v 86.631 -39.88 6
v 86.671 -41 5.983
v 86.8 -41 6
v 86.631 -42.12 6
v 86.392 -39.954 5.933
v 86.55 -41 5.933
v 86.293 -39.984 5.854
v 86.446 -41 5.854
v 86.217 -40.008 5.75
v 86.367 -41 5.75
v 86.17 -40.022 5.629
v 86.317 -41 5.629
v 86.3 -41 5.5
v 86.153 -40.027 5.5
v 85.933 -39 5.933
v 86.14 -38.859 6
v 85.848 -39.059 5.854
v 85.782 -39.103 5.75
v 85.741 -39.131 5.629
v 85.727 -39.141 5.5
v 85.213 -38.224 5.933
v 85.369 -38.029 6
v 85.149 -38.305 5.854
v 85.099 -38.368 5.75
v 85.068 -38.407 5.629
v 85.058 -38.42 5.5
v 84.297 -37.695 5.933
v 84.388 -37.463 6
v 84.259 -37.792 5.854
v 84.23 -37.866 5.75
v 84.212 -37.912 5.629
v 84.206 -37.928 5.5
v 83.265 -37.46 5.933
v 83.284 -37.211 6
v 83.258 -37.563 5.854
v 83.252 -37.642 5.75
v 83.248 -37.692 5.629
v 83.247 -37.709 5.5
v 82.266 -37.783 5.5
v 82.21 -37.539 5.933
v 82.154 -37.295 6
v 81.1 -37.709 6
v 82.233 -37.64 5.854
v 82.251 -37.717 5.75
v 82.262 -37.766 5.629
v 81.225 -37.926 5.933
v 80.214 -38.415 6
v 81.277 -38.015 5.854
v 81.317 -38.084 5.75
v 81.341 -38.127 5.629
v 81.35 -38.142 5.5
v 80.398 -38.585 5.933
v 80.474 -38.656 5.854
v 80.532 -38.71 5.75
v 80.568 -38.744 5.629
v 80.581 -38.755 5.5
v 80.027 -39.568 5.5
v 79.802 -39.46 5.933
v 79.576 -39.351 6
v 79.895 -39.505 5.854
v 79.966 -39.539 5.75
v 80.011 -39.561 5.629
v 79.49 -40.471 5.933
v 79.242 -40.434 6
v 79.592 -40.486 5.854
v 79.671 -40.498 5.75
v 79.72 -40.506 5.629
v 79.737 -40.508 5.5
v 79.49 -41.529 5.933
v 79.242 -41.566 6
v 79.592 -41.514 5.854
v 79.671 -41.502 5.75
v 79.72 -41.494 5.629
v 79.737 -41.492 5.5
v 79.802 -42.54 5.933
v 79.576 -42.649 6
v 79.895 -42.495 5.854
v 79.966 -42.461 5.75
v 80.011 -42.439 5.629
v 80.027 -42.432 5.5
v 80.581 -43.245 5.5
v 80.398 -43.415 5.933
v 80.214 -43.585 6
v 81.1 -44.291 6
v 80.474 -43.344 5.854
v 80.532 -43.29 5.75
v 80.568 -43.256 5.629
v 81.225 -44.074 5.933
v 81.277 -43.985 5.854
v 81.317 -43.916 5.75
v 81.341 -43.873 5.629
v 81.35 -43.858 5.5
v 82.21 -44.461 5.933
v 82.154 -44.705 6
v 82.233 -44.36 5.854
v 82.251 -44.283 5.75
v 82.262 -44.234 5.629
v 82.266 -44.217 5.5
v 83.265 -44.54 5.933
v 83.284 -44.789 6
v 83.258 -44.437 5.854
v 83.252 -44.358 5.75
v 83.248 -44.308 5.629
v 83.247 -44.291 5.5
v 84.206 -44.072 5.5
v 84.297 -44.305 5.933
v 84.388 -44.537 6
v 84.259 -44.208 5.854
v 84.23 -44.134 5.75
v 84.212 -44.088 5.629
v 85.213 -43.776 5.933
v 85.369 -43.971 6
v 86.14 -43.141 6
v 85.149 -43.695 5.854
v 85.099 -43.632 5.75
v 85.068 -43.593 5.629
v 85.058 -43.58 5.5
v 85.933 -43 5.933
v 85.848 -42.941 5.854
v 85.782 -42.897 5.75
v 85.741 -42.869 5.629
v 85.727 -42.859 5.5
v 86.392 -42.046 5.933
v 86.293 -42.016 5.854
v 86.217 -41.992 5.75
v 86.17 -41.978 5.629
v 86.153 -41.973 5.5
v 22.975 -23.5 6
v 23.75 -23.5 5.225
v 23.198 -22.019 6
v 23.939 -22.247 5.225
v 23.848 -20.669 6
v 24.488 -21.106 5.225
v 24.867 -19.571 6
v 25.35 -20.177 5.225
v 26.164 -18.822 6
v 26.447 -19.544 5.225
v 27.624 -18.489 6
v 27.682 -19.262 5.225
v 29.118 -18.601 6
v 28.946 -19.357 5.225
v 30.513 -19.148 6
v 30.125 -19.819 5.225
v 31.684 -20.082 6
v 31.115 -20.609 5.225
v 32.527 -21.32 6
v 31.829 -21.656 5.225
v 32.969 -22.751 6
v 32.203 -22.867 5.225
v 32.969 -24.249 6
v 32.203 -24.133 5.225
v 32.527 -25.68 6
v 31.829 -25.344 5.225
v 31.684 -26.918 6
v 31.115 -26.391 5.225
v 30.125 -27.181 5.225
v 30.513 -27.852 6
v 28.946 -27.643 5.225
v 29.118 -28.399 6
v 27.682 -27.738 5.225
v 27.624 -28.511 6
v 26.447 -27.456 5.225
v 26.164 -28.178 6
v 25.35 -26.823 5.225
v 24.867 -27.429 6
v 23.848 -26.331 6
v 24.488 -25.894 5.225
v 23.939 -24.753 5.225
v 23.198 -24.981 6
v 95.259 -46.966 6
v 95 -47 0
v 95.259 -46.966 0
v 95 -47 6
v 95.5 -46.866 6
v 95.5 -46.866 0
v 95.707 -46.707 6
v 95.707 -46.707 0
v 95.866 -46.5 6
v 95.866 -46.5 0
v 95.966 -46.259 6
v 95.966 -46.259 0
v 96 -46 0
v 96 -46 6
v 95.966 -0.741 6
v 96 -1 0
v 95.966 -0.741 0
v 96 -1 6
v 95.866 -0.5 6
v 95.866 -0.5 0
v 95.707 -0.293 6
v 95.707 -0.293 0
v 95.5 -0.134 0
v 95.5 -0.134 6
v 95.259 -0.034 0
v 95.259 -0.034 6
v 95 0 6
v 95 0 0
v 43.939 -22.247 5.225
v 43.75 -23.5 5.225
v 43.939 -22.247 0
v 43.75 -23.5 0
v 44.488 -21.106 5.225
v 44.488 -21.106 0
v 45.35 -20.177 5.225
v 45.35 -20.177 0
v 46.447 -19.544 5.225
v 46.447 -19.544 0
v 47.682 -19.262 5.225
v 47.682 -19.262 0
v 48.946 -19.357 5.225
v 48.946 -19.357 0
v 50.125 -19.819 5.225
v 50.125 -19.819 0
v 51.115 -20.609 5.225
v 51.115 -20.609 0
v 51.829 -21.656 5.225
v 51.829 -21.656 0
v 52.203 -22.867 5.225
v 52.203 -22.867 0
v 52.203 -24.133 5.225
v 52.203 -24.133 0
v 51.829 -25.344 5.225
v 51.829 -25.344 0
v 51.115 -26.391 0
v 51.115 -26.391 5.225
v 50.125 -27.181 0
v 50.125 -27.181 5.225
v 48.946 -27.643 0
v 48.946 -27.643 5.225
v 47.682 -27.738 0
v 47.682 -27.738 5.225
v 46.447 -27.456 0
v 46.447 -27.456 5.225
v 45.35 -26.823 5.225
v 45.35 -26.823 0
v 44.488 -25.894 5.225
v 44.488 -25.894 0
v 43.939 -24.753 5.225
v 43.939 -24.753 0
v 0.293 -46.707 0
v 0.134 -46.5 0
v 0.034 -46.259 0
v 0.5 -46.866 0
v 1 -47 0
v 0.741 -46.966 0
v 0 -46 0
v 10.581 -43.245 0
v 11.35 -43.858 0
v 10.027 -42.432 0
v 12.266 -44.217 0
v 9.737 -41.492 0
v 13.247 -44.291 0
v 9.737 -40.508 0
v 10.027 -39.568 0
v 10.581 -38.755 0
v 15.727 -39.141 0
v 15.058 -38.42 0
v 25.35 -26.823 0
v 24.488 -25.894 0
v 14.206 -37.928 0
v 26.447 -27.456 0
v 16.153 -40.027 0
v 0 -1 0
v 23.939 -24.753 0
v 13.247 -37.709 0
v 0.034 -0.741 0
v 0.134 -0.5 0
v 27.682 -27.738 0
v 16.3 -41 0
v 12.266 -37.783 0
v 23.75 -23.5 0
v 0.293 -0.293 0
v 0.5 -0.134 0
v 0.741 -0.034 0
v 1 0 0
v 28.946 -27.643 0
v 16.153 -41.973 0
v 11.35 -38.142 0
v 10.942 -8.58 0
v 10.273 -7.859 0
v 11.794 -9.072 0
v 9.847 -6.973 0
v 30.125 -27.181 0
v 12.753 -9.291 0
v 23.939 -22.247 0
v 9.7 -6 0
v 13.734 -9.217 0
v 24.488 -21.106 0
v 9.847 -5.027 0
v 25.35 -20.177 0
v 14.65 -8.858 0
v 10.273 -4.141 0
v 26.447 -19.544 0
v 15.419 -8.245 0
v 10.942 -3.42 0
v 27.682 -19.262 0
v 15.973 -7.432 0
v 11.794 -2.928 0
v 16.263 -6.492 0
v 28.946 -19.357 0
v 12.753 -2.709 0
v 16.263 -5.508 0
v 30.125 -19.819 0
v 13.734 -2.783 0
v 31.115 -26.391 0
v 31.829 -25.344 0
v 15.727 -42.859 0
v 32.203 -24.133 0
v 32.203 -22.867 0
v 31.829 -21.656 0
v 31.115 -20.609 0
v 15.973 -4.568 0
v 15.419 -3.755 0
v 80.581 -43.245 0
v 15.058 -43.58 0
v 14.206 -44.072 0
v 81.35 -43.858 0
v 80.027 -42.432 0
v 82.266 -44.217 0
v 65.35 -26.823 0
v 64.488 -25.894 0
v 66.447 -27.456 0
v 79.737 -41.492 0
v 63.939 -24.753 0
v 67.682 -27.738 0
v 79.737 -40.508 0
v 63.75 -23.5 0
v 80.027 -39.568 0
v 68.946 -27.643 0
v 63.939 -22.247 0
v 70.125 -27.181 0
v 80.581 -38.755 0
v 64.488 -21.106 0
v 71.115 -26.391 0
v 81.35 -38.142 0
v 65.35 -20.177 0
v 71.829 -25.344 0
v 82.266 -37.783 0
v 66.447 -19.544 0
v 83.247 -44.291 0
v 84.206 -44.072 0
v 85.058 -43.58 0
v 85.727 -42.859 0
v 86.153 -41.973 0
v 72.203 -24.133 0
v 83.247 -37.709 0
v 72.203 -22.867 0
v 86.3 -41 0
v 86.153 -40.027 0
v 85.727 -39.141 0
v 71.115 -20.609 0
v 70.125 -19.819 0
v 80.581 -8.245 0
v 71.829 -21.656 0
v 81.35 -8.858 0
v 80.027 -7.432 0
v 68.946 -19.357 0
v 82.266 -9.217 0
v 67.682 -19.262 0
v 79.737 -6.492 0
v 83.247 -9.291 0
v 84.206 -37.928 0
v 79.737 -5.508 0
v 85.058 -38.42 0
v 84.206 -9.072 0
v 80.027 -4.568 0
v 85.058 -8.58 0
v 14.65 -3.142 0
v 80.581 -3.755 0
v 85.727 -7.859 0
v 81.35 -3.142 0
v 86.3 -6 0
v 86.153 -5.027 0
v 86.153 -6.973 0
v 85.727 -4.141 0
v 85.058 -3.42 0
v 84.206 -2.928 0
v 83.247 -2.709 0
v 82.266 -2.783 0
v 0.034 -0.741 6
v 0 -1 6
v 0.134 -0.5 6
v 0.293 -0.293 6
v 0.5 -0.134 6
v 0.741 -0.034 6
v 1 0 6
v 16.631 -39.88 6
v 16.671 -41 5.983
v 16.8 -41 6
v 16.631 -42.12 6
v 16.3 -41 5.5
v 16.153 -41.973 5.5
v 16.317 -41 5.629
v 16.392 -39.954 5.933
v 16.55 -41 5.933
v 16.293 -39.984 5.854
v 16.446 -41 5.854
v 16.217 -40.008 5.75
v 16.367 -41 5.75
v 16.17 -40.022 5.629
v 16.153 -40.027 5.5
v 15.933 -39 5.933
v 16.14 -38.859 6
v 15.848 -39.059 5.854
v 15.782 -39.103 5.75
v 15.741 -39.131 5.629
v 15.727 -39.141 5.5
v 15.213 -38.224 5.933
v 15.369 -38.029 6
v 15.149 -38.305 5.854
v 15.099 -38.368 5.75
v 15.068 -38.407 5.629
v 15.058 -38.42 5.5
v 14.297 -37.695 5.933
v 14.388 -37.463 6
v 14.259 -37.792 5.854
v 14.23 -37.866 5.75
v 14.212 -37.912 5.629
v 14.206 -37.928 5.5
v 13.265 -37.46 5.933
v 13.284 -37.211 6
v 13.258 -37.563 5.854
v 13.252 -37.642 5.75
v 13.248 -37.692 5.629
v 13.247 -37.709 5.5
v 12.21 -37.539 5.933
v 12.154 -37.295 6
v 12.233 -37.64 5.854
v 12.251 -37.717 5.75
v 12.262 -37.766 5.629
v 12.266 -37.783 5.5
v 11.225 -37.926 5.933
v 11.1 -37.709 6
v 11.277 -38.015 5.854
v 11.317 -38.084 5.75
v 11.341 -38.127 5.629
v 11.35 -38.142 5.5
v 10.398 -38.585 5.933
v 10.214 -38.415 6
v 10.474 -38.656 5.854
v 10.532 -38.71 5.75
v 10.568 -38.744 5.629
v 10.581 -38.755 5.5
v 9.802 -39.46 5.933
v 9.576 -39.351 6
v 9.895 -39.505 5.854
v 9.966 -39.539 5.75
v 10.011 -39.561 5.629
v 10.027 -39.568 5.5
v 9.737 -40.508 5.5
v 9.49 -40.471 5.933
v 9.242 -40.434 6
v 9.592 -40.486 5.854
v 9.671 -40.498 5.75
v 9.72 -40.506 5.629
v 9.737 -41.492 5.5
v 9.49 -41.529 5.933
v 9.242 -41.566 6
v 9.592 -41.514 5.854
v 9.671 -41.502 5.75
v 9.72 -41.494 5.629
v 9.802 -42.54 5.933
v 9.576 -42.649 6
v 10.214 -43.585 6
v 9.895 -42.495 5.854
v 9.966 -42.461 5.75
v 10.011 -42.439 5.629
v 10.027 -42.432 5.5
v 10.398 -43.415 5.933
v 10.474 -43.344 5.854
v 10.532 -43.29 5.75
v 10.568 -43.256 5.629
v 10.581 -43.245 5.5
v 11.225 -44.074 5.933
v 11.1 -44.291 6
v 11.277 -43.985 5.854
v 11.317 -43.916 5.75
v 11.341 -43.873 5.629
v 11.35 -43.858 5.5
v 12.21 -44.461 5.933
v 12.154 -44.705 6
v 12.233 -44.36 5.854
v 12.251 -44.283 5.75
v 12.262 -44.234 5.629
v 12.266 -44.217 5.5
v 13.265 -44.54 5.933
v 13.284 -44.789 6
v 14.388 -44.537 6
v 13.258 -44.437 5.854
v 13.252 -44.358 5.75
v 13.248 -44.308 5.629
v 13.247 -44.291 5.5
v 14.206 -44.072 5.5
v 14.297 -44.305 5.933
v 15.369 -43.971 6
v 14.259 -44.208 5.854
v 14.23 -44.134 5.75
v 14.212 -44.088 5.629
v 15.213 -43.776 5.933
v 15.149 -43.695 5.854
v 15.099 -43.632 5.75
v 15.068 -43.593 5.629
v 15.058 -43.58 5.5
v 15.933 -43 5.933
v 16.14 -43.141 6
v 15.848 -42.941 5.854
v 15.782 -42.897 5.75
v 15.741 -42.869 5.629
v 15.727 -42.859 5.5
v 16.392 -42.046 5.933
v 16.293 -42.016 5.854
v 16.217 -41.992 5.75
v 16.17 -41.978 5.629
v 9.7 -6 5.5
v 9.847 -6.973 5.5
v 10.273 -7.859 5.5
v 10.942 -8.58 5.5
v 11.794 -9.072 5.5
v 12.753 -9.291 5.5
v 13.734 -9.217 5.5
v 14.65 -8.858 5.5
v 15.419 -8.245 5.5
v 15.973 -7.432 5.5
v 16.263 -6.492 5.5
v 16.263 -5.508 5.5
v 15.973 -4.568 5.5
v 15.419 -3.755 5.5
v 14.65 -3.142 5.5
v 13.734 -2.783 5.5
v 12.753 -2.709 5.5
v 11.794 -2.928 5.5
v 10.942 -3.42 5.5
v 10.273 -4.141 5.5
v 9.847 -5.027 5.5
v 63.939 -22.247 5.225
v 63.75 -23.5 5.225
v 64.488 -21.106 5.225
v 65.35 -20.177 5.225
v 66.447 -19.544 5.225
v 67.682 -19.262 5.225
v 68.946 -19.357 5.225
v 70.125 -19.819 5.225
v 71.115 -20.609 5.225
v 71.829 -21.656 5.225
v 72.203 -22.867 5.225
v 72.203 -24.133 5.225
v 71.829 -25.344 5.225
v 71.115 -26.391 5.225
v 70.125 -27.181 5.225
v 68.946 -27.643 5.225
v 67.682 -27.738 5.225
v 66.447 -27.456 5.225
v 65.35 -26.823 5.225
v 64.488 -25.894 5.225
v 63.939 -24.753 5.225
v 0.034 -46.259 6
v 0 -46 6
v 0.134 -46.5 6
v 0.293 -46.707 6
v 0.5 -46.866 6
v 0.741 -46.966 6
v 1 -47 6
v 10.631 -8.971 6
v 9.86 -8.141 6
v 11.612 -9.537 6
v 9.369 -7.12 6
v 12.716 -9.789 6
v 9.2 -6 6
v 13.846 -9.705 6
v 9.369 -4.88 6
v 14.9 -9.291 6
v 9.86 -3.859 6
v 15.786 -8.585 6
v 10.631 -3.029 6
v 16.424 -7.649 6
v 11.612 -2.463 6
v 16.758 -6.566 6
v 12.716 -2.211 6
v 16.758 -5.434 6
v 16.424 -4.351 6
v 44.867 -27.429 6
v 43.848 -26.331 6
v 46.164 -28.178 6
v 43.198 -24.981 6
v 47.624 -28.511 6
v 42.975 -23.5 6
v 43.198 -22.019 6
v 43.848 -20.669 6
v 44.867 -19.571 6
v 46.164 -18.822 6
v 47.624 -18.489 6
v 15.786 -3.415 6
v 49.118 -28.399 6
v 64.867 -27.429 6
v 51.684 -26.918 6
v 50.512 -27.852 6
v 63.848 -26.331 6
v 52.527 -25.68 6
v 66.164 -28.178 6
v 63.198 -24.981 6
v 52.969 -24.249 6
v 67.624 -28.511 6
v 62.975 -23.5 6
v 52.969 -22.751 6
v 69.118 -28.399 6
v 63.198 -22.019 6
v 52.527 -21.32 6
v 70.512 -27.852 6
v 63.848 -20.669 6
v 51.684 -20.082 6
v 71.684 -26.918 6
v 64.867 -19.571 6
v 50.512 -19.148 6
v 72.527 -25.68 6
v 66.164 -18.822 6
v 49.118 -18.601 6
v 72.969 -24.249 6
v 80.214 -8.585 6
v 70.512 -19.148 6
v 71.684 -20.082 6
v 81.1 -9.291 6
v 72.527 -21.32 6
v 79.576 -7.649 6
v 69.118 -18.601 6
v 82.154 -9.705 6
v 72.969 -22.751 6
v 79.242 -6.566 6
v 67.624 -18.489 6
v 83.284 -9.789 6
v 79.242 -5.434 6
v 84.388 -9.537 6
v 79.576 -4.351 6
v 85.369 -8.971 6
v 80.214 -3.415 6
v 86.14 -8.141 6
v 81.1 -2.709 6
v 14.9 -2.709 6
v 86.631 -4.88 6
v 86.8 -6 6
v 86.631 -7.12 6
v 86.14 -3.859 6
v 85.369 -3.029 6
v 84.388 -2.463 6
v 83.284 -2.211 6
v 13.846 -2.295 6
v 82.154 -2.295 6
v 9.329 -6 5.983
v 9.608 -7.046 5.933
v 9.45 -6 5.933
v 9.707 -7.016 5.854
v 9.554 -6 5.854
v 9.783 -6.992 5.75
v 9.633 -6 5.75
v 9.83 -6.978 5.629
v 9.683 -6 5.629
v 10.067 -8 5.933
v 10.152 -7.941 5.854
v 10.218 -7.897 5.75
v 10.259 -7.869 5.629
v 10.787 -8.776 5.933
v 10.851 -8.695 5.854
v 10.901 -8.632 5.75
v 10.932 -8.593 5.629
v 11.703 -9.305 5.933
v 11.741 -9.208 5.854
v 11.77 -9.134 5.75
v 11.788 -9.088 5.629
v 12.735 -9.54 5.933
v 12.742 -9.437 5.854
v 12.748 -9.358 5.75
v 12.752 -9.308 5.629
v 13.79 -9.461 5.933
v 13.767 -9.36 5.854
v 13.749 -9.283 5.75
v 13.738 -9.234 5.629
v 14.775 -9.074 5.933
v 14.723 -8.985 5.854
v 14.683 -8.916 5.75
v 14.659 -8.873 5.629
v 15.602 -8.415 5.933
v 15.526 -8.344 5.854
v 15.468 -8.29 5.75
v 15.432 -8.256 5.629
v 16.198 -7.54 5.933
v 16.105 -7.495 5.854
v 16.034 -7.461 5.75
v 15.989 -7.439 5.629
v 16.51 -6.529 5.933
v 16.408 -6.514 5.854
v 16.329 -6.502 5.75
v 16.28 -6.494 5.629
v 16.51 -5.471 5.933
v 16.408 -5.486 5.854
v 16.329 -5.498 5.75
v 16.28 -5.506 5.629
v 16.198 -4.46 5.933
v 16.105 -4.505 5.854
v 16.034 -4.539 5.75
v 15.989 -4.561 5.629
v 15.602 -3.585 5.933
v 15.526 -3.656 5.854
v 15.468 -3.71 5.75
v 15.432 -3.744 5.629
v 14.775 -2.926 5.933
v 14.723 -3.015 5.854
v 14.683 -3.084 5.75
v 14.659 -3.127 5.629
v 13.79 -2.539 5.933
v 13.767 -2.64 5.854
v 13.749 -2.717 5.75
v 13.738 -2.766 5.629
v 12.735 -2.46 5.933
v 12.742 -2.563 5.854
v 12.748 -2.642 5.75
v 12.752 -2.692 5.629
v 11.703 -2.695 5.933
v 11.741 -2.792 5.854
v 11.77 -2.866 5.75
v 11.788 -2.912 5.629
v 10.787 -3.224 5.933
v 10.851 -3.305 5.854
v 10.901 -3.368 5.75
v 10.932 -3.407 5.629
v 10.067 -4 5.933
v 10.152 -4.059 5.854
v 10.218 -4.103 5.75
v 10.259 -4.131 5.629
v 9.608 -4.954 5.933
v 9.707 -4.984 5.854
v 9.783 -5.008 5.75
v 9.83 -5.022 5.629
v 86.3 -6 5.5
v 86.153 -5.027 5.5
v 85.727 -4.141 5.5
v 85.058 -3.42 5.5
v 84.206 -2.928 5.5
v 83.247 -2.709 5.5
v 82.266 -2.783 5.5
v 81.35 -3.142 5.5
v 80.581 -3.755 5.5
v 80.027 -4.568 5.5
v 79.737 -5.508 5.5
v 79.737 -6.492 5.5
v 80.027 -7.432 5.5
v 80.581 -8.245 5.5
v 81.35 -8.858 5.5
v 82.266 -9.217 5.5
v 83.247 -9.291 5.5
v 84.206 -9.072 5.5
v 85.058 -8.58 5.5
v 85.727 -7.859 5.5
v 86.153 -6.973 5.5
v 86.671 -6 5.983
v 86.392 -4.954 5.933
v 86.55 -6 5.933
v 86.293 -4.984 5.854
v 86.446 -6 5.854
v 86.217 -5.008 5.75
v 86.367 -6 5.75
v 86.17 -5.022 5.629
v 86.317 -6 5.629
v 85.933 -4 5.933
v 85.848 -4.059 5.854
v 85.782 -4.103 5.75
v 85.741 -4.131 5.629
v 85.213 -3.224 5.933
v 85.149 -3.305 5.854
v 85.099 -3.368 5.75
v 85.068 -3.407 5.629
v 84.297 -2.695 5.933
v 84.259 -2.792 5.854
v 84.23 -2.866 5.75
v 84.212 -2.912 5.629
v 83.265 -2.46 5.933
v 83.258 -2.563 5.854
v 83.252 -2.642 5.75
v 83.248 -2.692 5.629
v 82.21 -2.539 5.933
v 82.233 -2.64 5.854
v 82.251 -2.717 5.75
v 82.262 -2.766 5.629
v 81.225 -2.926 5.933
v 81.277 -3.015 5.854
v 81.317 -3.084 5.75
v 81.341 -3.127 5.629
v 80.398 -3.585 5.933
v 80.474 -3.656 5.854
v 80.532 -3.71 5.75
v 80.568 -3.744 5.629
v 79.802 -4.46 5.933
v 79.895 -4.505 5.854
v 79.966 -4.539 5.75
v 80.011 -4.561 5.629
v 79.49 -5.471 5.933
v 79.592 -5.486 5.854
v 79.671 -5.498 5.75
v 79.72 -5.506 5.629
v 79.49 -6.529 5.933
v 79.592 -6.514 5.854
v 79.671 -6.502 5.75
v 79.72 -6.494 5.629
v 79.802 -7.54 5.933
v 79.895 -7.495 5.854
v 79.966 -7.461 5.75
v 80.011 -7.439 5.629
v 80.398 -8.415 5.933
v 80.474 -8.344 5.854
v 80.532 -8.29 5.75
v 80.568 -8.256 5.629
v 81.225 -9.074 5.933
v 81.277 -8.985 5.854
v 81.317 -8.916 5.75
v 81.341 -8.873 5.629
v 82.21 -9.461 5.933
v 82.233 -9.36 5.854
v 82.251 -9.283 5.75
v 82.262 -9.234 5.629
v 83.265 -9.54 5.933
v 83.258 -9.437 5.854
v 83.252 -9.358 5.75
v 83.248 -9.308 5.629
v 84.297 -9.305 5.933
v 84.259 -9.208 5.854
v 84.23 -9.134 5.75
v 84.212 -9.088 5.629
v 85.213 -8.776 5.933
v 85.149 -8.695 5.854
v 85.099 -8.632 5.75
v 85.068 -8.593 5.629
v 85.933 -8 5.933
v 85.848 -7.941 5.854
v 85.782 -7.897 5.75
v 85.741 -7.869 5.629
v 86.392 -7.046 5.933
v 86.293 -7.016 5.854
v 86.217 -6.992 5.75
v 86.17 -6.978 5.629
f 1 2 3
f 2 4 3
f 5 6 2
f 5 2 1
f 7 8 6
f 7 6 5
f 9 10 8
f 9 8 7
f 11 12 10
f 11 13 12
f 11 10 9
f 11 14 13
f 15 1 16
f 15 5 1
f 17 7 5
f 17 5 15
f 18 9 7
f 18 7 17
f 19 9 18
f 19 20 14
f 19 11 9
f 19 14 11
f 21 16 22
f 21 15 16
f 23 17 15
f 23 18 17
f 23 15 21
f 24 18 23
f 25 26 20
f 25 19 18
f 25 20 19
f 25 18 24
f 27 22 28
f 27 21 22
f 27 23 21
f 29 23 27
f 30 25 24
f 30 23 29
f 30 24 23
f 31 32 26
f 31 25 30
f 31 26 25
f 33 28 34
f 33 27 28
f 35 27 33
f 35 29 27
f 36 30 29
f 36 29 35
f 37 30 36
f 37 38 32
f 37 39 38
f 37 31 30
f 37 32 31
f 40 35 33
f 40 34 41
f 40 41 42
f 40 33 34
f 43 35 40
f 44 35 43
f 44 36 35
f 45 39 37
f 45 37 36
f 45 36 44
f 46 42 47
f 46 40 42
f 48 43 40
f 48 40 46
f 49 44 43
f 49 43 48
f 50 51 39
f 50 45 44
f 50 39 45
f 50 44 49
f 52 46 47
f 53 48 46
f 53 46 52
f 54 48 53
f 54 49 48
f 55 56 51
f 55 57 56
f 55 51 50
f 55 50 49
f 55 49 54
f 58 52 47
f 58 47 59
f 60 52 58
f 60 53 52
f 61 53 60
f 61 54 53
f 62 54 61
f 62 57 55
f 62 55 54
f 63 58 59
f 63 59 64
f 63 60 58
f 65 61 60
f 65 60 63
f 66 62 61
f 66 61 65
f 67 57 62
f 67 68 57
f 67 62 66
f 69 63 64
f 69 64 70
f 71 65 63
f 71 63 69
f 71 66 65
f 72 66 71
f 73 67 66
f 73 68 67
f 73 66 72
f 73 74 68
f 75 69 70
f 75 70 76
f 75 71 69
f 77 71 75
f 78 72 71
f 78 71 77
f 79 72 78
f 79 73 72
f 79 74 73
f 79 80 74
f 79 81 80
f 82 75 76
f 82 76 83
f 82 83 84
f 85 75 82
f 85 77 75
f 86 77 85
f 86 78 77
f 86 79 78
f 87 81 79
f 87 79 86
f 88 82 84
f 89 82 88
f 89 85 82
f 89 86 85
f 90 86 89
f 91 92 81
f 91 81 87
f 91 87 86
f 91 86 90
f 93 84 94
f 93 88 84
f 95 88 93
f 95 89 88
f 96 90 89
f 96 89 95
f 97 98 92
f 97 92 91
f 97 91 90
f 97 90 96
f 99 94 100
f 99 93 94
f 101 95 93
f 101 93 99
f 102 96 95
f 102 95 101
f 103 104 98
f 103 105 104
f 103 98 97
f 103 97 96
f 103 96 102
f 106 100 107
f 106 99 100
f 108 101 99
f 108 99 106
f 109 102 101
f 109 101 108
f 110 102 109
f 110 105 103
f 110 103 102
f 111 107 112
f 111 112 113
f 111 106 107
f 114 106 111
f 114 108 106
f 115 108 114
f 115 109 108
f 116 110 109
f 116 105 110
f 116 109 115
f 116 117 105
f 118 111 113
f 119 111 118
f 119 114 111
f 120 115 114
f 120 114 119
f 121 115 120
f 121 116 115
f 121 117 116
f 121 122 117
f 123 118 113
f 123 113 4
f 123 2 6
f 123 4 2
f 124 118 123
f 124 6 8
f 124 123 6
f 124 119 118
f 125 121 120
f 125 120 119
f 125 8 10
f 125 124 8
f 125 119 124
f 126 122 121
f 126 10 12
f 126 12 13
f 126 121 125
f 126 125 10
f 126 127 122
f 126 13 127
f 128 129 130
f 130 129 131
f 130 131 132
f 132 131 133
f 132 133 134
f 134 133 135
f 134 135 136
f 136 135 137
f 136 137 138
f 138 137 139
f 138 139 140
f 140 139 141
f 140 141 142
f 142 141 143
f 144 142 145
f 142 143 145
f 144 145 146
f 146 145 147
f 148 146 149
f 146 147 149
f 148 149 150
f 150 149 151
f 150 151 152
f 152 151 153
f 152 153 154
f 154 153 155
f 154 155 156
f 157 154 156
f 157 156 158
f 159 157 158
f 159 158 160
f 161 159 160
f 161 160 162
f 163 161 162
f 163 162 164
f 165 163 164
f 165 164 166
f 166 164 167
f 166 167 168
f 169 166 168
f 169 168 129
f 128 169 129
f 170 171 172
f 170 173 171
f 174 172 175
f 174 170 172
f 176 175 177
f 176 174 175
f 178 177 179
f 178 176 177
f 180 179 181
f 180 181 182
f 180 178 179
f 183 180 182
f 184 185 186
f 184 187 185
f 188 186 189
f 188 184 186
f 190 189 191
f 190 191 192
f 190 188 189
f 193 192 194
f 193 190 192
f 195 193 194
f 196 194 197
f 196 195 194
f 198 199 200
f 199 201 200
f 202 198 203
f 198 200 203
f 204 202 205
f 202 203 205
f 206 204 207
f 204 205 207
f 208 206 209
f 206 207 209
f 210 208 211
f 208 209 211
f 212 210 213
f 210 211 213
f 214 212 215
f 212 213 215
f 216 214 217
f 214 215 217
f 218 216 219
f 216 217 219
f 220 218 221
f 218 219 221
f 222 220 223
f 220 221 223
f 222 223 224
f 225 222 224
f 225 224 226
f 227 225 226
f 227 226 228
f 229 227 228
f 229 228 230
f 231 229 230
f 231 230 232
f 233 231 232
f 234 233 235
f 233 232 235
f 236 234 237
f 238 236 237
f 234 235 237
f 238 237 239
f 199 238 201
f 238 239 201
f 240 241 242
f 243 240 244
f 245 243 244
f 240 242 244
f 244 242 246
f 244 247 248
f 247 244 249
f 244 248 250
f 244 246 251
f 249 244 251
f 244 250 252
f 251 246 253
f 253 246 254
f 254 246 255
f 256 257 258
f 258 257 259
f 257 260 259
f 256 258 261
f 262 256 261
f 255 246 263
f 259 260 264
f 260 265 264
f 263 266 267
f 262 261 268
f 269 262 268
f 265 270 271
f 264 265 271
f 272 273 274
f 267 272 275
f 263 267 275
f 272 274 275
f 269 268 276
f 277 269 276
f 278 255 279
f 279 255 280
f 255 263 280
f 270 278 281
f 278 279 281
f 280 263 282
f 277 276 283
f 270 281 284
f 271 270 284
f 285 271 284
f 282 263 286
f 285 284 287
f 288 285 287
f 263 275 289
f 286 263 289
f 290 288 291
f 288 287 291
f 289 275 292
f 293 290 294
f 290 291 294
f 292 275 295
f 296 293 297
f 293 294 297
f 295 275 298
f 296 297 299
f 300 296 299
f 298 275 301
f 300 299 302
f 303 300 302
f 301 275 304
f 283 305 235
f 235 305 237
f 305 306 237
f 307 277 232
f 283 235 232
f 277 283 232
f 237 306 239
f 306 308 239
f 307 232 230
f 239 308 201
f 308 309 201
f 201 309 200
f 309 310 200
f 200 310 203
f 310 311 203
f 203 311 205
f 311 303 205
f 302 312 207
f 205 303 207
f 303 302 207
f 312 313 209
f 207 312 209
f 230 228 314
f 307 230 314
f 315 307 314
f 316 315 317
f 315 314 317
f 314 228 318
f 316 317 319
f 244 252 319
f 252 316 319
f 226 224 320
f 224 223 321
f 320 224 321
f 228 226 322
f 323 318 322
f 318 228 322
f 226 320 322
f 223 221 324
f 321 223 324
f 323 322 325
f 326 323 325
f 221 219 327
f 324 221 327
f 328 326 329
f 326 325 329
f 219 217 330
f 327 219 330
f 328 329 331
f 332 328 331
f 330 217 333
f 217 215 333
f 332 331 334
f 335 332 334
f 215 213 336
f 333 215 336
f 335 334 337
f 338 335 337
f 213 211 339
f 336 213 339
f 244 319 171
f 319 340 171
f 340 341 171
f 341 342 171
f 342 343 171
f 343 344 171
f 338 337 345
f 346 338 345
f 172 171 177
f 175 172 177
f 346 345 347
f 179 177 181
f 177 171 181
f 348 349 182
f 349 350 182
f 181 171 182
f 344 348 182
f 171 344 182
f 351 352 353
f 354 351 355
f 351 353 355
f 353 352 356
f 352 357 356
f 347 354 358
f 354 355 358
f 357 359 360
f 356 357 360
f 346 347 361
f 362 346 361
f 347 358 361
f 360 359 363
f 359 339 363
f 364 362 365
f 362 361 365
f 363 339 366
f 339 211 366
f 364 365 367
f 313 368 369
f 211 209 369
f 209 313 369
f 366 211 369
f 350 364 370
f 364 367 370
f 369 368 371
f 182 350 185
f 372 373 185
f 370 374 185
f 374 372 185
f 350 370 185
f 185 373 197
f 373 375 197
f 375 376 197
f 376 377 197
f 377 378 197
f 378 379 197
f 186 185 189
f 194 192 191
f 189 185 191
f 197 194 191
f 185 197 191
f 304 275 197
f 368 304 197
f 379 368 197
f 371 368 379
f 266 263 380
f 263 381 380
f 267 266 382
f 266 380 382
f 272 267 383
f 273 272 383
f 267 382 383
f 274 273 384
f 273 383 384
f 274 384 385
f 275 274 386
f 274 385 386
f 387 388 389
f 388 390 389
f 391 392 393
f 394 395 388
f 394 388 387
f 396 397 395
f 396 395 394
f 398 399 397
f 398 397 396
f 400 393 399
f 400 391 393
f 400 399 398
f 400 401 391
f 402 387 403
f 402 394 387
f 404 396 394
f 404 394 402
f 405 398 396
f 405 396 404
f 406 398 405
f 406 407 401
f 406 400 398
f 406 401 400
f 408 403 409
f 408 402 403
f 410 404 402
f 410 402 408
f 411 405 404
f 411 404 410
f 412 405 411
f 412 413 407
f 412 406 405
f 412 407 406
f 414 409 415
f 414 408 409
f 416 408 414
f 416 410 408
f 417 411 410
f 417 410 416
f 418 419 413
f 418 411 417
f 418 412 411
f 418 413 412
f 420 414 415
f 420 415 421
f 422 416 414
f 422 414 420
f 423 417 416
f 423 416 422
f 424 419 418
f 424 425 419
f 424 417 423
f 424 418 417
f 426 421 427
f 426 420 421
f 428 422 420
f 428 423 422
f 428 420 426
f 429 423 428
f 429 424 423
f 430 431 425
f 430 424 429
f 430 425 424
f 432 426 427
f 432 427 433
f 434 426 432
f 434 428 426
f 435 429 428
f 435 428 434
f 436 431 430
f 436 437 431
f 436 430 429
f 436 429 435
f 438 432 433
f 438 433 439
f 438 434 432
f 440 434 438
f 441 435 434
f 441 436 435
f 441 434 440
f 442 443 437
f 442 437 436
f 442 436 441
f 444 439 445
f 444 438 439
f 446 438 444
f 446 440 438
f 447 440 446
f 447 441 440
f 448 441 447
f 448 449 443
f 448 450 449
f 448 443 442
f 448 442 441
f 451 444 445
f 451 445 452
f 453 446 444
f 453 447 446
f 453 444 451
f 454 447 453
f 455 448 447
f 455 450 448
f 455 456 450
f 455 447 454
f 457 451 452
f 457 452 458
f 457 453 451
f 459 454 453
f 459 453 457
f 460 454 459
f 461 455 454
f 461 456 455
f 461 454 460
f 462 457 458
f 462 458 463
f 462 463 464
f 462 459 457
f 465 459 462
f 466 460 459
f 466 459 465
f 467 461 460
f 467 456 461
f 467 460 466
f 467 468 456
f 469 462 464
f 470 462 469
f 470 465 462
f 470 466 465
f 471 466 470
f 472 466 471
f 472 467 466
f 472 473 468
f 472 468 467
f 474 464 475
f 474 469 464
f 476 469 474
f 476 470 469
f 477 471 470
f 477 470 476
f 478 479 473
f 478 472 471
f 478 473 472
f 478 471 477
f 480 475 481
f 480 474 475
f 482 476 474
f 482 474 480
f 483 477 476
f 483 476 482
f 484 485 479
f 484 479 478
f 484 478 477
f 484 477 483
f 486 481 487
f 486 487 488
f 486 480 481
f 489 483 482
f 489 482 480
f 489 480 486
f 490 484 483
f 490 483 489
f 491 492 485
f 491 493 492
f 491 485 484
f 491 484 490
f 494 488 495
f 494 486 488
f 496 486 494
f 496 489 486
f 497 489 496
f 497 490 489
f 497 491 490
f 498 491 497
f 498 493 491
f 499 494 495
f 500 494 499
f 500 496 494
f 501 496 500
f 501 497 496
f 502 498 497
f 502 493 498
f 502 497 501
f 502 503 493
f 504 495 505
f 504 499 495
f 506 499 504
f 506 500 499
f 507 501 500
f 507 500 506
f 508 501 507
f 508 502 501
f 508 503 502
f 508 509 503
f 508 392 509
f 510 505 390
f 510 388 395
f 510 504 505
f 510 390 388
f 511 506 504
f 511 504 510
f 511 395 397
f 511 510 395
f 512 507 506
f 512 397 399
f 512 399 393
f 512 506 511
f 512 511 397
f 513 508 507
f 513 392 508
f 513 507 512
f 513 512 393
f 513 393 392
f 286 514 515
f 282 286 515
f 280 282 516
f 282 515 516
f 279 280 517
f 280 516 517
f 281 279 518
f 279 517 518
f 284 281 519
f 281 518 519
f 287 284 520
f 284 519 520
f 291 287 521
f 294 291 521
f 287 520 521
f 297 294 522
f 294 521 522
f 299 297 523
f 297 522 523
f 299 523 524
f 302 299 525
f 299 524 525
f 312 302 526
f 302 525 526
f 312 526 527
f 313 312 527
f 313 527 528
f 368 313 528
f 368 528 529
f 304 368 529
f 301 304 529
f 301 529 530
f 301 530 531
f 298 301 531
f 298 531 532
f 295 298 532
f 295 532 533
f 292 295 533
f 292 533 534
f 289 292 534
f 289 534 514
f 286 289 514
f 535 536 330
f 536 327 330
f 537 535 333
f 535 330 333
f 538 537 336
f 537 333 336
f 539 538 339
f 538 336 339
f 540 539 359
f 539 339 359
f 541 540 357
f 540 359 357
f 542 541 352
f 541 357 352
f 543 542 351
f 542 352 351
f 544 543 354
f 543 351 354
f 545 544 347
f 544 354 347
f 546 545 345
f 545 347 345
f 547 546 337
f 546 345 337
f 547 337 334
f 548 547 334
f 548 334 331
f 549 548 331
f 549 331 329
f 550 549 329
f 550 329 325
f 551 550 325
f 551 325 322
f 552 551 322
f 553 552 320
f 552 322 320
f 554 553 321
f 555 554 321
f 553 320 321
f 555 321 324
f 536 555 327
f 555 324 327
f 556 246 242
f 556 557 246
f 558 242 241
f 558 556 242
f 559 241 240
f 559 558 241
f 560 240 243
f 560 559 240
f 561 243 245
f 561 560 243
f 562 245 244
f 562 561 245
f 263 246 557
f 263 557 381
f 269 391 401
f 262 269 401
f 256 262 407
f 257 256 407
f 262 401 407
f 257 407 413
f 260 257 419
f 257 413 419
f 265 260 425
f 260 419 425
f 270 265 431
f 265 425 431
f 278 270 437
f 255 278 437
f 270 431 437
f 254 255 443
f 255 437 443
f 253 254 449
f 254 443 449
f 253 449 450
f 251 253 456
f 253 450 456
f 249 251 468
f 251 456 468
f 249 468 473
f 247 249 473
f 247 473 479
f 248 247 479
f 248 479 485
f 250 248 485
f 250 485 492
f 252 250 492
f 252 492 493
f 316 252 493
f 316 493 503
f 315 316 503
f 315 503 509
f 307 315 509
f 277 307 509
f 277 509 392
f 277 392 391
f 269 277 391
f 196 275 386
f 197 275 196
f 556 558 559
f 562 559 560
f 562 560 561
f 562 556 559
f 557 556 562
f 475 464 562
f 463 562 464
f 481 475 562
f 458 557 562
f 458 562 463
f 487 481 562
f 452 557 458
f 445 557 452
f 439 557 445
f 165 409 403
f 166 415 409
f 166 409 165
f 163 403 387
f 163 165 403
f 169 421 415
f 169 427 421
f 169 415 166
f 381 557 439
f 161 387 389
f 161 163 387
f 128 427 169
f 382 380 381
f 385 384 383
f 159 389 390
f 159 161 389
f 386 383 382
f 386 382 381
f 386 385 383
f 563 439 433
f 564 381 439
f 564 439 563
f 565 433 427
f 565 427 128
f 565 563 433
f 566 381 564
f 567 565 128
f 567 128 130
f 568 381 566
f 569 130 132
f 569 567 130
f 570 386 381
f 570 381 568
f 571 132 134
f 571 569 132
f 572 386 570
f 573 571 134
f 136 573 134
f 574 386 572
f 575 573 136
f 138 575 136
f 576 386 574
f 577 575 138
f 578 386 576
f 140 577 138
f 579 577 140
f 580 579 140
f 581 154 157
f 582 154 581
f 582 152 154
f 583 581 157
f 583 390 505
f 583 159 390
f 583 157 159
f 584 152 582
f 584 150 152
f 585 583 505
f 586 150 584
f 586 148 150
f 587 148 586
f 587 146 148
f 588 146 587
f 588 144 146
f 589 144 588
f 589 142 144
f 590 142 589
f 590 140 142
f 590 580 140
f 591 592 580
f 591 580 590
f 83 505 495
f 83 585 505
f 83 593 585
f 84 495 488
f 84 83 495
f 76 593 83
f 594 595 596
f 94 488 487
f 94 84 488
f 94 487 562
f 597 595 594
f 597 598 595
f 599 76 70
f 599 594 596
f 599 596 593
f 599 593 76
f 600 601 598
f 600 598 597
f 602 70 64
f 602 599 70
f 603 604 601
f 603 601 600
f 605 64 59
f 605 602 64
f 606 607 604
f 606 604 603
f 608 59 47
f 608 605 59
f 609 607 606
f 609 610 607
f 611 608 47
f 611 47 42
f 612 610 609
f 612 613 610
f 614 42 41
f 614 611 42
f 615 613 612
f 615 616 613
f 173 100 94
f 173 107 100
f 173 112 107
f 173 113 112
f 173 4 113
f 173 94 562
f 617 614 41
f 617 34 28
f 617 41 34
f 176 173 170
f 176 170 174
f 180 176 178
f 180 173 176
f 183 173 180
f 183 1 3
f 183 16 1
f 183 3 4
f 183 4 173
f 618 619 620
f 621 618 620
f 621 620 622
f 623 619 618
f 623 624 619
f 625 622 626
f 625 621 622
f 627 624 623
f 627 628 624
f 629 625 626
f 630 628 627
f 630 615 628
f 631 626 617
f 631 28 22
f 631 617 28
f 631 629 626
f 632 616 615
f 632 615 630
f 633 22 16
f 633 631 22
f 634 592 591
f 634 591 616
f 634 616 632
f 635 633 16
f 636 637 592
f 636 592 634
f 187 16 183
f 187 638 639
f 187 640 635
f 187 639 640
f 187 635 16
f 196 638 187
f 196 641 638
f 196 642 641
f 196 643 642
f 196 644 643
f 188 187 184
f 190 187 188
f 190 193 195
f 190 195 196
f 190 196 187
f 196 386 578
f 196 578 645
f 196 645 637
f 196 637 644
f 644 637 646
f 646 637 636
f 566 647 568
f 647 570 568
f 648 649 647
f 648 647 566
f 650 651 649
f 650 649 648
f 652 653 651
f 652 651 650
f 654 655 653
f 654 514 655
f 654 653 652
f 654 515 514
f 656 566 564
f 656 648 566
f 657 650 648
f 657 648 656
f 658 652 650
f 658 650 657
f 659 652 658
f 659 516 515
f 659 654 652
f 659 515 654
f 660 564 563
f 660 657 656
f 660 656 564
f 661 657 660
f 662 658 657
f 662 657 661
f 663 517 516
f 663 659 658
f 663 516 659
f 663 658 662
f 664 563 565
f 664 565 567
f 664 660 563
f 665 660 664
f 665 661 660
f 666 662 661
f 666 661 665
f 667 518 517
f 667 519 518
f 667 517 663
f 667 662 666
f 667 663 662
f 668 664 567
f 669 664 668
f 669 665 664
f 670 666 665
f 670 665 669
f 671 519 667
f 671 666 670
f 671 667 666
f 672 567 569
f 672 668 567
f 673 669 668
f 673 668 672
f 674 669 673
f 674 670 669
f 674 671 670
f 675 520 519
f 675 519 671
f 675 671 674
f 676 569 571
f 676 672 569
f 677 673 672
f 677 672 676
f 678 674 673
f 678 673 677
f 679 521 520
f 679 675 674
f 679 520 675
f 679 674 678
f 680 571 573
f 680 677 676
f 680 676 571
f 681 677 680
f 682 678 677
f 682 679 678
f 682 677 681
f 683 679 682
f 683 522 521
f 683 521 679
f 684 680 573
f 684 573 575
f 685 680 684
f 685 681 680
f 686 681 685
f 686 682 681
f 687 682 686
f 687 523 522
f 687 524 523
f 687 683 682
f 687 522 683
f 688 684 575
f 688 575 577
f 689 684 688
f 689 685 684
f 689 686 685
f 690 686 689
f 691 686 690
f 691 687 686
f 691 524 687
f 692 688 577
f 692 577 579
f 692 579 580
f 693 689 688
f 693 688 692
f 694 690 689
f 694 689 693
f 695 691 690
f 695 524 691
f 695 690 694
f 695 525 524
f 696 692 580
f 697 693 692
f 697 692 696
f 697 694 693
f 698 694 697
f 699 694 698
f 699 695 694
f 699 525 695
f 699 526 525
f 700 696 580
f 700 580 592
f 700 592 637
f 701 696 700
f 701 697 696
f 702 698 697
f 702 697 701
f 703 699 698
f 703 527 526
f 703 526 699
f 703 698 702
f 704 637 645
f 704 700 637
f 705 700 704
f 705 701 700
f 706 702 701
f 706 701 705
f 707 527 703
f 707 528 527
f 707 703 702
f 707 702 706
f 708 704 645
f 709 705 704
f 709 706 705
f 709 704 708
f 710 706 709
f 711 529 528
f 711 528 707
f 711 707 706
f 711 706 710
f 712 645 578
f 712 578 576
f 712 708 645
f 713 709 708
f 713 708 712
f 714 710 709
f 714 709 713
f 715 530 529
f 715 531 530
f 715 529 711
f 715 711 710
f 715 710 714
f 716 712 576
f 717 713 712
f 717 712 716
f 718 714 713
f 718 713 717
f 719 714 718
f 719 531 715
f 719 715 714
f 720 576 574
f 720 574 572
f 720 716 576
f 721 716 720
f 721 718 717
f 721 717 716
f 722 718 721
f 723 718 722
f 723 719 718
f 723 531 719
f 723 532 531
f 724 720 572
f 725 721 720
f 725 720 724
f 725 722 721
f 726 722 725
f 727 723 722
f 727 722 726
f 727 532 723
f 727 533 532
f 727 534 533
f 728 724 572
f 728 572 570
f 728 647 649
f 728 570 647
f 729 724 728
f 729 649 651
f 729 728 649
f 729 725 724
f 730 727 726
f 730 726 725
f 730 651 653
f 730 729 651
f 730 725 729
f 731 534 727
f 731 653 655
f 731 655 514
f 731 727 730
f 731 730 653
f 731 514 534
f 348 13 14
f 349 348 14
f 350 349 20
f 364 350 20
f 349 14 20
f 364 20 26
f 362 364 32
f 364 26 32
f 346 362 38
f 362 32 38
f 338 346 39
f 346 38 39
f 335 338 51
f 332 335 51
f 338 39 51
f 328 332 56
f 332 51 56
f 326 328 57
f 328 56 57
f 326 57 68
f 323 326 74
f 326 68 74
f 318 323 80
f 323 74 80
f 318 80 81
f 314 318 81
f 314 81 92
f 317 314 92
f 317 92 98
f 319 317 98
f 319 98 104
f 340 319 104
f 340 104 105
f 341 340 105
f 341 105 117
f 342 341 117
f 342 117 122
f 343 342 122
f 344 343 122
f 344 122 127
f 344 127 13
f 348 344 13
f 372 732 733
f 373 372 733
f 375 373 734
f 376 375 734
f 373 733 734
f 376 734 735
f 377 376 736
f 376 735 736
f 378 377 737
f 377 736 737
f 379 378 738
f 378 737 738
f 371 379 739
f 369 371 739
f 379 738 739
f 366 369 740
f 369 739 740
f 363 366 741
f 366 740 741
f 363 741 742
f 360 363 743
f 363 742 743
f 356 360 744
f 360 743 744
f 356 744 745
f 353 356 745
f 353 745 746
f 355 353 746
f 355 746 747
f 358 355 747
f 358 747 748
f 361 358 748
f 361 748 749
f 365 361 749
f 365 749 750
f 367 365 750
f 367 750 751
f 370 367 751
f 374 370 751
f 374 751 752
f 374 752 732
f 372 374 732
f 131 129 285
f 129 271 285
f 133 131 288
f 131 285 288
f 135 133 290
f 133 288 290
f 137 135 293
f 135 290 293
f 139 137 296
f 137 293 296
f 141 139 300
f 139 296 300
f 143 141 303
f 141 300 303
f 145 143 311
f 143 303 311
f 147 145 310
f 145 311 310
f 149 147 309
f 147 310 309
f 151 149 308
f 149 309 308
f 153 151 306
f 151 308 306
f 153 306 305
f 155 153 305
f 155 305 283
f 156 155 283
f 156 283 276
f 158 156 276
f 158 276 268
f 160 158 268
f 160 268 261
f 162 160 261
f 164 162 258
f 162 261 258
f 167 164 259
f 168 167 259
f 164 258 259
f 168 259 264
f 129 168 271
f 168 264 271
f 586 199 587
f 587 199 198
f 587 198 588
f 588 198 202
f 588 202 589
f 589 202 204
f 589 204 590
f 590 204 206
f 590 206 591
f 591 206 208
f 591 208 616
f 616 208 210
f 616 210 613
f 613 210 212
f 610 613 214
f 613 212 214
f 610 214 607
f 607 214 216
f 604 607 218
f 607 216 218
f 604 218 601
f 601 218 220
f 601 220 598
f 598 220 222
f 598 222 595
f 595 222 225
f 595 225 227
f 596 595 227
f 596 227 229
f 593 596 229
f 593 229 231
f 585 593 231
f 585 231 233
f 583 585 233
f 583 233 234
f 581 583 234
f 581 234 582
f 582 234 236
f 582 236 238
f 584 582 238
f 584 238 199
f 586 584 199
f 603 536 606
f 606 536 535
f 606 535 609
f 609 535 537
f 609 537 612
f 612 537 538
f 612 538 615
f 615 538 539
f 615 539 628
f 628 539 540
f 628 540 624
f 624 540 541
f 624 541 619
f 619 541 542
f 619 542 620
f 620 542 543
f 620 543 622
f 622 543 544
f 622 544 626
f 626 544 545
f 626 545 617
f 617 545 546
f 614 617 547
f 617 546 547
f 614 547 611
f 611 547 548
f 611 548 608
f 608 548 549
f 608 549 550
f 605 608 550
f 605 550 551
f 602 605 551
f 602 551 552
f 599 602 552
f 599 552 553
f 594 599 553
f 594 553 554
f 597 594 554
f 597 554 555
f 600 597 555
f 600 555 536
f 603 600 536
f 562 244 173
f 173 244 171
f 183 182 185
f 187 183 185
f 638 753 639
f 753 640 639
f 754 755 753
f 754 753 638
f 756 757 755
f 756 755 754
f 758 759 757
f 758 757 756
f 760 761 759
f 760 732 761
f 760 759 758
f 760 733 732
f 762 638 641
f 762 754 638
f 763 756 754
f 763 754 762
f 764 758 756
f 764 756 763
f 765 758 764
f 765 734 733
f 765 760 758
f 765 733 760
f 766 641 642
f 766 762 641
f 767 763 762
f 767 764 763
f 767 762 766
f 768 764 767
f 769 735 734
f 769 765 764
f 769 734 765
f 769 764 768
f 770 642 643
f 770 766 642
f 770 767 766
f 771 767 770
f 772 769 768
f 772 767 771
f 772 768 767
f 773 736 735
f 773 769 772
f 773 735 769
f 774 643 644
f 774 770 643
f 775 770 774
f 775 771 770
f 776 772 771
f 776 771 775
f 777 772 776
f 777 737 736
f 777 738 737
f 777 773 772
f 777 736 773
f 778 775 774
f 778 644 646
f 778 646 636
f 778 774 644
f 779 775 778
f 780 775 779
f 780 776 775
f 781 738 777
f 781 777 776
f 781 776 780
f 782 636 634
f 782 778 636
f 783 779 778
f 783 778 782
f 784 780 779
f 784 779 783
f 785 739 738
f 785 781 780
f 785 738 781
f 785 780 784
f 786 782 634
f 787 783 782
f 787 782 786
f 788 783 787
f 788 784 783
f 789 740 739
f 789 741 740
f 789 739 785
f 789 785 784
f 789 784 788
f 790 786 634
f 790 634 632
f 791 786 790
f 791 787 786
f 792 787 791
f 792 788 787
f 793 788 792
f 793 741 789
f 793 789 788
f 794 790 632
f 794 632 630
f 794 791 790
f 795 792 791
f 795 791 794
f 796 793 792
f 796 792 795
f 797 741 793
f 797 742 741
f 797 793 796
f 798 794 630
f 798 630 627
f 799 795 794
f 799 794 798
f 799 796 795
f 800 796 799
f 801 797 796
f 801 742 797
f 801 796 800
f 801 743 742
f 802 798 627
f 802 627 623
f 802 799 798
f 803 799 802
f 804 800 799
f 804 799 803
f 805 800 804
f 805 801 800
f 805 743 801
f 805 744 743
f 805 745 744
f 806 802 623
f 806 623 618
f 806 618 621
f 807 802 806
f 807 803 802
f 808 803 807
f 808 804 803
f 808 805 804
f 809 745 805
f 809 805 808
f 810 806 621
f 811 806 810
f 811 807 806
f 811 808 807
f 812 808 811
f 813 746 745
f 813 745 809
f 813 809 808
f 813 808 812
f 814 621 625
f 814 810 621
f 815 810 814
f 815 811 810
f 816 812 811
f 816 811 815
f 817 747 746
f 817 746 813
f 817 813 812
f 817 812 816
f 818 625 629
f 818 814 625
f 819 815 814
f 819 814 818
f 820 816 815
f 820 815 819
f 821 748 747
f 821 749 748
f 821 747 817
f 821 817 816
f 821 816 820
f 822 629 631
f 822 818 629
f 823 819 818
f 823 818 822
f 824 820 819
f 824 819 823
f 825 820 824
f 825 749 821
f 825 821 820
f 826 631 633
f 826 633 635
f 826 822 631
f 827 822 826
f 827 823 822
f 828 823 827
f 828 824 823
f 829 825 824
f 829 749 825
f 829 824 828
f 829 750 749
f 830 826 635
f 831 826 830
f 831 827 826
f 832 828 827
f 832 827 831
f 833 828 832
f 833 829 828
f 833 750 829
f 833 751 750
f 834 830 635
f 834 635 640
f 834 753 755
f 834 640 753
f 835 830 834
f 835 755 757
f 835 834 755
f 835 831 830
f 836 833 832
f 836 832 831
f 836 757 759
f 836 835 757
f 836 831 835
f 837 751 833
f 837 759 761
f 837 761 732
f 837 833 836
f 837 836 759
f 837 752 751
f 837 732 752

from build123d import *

# Parameters (mm, degrees)
SKETCH_1_W                    = 96
SKETCH_1_H                    = 47
EXTRUDE_1_DEPTH               = 6
FILLET_1_R                    = 1
HOLE_WIZARD_M10_1_D           = 8.5
HOLE_WIZARD_M10_1_CSINK_D     = 10.05
HOLE_WIZARD_M10_1_CSINK_ANGLE = 90
SKETCH_2_R                    = 3.3
CUT_EXTRUDE_1_DEPTH           = 10
FILLET_2_R                    = 0.5


with BuildPart() as part:
    # 草图1 → 凸台-拉伸1 (new body)
    with BuildSketch(Plane.XY):
        with Locations((48, -23.5)):
            Rectangle(SKETCH_1_W, SKETCH_1_H)
    extrude(amount=EXTRUDE_1_DEPTH)

    # 圆角1
    fillet_1_edges = [part.edges().sort_by_distance(p)[0] for p in [
        (0, 0, 3),
        (96, 0, 3),
        (96, -47, 3),
        (0, -47, 3),
    ]]
    fillet(fillet_1_edges, radius=FILLET_1_R)

    # M10 螺纹孔1 (through all)
    with Locations(Plane.XY.offset(6)):
        with Locations((28, -23.5), (48, -23.5), (68, -23.5)):
            CounterSinkHole(HOLE_WIZARD_M10_1_D / 2, HOLE_WIZARD_M10_1_CSINK_D / 2, counter_sink_angle=HOLE_WIZARD_M10_1_CSINK_ANGLE)

    # 草图2 → 切除-拉伸1 (cut)
    with BuildSketch(Plane.XY.offset(6)):
        with Locations((83, -6)):
            Circle(SKETCH_2_R)
        with Locations((83, -41)):
            Circle(SKETCH_2_R)
        with Locations((13, -41)):
            Circle(SKETCH_2_R)
        with Locations(Location((13, -6, 0), (0, 0, 180))):
            Circle(SKETCH_2_R)
    extrude(amount=-CUT_EXTRUDE_1_DEPTH, mode=Mode.SUBTRACT)

    # 圆角2
    fillet_2_edges = [part.edges().sort_by_distance(p)[0] for p in [
        (16.3, -6, 6),
        (9.7, -41, 6),
        (79.7, -41, 6),
        (79.7, -6, 6),
    ]]
    fillet(fillet_2_edges, radius=FILLET_2_R)


solid = part.part
